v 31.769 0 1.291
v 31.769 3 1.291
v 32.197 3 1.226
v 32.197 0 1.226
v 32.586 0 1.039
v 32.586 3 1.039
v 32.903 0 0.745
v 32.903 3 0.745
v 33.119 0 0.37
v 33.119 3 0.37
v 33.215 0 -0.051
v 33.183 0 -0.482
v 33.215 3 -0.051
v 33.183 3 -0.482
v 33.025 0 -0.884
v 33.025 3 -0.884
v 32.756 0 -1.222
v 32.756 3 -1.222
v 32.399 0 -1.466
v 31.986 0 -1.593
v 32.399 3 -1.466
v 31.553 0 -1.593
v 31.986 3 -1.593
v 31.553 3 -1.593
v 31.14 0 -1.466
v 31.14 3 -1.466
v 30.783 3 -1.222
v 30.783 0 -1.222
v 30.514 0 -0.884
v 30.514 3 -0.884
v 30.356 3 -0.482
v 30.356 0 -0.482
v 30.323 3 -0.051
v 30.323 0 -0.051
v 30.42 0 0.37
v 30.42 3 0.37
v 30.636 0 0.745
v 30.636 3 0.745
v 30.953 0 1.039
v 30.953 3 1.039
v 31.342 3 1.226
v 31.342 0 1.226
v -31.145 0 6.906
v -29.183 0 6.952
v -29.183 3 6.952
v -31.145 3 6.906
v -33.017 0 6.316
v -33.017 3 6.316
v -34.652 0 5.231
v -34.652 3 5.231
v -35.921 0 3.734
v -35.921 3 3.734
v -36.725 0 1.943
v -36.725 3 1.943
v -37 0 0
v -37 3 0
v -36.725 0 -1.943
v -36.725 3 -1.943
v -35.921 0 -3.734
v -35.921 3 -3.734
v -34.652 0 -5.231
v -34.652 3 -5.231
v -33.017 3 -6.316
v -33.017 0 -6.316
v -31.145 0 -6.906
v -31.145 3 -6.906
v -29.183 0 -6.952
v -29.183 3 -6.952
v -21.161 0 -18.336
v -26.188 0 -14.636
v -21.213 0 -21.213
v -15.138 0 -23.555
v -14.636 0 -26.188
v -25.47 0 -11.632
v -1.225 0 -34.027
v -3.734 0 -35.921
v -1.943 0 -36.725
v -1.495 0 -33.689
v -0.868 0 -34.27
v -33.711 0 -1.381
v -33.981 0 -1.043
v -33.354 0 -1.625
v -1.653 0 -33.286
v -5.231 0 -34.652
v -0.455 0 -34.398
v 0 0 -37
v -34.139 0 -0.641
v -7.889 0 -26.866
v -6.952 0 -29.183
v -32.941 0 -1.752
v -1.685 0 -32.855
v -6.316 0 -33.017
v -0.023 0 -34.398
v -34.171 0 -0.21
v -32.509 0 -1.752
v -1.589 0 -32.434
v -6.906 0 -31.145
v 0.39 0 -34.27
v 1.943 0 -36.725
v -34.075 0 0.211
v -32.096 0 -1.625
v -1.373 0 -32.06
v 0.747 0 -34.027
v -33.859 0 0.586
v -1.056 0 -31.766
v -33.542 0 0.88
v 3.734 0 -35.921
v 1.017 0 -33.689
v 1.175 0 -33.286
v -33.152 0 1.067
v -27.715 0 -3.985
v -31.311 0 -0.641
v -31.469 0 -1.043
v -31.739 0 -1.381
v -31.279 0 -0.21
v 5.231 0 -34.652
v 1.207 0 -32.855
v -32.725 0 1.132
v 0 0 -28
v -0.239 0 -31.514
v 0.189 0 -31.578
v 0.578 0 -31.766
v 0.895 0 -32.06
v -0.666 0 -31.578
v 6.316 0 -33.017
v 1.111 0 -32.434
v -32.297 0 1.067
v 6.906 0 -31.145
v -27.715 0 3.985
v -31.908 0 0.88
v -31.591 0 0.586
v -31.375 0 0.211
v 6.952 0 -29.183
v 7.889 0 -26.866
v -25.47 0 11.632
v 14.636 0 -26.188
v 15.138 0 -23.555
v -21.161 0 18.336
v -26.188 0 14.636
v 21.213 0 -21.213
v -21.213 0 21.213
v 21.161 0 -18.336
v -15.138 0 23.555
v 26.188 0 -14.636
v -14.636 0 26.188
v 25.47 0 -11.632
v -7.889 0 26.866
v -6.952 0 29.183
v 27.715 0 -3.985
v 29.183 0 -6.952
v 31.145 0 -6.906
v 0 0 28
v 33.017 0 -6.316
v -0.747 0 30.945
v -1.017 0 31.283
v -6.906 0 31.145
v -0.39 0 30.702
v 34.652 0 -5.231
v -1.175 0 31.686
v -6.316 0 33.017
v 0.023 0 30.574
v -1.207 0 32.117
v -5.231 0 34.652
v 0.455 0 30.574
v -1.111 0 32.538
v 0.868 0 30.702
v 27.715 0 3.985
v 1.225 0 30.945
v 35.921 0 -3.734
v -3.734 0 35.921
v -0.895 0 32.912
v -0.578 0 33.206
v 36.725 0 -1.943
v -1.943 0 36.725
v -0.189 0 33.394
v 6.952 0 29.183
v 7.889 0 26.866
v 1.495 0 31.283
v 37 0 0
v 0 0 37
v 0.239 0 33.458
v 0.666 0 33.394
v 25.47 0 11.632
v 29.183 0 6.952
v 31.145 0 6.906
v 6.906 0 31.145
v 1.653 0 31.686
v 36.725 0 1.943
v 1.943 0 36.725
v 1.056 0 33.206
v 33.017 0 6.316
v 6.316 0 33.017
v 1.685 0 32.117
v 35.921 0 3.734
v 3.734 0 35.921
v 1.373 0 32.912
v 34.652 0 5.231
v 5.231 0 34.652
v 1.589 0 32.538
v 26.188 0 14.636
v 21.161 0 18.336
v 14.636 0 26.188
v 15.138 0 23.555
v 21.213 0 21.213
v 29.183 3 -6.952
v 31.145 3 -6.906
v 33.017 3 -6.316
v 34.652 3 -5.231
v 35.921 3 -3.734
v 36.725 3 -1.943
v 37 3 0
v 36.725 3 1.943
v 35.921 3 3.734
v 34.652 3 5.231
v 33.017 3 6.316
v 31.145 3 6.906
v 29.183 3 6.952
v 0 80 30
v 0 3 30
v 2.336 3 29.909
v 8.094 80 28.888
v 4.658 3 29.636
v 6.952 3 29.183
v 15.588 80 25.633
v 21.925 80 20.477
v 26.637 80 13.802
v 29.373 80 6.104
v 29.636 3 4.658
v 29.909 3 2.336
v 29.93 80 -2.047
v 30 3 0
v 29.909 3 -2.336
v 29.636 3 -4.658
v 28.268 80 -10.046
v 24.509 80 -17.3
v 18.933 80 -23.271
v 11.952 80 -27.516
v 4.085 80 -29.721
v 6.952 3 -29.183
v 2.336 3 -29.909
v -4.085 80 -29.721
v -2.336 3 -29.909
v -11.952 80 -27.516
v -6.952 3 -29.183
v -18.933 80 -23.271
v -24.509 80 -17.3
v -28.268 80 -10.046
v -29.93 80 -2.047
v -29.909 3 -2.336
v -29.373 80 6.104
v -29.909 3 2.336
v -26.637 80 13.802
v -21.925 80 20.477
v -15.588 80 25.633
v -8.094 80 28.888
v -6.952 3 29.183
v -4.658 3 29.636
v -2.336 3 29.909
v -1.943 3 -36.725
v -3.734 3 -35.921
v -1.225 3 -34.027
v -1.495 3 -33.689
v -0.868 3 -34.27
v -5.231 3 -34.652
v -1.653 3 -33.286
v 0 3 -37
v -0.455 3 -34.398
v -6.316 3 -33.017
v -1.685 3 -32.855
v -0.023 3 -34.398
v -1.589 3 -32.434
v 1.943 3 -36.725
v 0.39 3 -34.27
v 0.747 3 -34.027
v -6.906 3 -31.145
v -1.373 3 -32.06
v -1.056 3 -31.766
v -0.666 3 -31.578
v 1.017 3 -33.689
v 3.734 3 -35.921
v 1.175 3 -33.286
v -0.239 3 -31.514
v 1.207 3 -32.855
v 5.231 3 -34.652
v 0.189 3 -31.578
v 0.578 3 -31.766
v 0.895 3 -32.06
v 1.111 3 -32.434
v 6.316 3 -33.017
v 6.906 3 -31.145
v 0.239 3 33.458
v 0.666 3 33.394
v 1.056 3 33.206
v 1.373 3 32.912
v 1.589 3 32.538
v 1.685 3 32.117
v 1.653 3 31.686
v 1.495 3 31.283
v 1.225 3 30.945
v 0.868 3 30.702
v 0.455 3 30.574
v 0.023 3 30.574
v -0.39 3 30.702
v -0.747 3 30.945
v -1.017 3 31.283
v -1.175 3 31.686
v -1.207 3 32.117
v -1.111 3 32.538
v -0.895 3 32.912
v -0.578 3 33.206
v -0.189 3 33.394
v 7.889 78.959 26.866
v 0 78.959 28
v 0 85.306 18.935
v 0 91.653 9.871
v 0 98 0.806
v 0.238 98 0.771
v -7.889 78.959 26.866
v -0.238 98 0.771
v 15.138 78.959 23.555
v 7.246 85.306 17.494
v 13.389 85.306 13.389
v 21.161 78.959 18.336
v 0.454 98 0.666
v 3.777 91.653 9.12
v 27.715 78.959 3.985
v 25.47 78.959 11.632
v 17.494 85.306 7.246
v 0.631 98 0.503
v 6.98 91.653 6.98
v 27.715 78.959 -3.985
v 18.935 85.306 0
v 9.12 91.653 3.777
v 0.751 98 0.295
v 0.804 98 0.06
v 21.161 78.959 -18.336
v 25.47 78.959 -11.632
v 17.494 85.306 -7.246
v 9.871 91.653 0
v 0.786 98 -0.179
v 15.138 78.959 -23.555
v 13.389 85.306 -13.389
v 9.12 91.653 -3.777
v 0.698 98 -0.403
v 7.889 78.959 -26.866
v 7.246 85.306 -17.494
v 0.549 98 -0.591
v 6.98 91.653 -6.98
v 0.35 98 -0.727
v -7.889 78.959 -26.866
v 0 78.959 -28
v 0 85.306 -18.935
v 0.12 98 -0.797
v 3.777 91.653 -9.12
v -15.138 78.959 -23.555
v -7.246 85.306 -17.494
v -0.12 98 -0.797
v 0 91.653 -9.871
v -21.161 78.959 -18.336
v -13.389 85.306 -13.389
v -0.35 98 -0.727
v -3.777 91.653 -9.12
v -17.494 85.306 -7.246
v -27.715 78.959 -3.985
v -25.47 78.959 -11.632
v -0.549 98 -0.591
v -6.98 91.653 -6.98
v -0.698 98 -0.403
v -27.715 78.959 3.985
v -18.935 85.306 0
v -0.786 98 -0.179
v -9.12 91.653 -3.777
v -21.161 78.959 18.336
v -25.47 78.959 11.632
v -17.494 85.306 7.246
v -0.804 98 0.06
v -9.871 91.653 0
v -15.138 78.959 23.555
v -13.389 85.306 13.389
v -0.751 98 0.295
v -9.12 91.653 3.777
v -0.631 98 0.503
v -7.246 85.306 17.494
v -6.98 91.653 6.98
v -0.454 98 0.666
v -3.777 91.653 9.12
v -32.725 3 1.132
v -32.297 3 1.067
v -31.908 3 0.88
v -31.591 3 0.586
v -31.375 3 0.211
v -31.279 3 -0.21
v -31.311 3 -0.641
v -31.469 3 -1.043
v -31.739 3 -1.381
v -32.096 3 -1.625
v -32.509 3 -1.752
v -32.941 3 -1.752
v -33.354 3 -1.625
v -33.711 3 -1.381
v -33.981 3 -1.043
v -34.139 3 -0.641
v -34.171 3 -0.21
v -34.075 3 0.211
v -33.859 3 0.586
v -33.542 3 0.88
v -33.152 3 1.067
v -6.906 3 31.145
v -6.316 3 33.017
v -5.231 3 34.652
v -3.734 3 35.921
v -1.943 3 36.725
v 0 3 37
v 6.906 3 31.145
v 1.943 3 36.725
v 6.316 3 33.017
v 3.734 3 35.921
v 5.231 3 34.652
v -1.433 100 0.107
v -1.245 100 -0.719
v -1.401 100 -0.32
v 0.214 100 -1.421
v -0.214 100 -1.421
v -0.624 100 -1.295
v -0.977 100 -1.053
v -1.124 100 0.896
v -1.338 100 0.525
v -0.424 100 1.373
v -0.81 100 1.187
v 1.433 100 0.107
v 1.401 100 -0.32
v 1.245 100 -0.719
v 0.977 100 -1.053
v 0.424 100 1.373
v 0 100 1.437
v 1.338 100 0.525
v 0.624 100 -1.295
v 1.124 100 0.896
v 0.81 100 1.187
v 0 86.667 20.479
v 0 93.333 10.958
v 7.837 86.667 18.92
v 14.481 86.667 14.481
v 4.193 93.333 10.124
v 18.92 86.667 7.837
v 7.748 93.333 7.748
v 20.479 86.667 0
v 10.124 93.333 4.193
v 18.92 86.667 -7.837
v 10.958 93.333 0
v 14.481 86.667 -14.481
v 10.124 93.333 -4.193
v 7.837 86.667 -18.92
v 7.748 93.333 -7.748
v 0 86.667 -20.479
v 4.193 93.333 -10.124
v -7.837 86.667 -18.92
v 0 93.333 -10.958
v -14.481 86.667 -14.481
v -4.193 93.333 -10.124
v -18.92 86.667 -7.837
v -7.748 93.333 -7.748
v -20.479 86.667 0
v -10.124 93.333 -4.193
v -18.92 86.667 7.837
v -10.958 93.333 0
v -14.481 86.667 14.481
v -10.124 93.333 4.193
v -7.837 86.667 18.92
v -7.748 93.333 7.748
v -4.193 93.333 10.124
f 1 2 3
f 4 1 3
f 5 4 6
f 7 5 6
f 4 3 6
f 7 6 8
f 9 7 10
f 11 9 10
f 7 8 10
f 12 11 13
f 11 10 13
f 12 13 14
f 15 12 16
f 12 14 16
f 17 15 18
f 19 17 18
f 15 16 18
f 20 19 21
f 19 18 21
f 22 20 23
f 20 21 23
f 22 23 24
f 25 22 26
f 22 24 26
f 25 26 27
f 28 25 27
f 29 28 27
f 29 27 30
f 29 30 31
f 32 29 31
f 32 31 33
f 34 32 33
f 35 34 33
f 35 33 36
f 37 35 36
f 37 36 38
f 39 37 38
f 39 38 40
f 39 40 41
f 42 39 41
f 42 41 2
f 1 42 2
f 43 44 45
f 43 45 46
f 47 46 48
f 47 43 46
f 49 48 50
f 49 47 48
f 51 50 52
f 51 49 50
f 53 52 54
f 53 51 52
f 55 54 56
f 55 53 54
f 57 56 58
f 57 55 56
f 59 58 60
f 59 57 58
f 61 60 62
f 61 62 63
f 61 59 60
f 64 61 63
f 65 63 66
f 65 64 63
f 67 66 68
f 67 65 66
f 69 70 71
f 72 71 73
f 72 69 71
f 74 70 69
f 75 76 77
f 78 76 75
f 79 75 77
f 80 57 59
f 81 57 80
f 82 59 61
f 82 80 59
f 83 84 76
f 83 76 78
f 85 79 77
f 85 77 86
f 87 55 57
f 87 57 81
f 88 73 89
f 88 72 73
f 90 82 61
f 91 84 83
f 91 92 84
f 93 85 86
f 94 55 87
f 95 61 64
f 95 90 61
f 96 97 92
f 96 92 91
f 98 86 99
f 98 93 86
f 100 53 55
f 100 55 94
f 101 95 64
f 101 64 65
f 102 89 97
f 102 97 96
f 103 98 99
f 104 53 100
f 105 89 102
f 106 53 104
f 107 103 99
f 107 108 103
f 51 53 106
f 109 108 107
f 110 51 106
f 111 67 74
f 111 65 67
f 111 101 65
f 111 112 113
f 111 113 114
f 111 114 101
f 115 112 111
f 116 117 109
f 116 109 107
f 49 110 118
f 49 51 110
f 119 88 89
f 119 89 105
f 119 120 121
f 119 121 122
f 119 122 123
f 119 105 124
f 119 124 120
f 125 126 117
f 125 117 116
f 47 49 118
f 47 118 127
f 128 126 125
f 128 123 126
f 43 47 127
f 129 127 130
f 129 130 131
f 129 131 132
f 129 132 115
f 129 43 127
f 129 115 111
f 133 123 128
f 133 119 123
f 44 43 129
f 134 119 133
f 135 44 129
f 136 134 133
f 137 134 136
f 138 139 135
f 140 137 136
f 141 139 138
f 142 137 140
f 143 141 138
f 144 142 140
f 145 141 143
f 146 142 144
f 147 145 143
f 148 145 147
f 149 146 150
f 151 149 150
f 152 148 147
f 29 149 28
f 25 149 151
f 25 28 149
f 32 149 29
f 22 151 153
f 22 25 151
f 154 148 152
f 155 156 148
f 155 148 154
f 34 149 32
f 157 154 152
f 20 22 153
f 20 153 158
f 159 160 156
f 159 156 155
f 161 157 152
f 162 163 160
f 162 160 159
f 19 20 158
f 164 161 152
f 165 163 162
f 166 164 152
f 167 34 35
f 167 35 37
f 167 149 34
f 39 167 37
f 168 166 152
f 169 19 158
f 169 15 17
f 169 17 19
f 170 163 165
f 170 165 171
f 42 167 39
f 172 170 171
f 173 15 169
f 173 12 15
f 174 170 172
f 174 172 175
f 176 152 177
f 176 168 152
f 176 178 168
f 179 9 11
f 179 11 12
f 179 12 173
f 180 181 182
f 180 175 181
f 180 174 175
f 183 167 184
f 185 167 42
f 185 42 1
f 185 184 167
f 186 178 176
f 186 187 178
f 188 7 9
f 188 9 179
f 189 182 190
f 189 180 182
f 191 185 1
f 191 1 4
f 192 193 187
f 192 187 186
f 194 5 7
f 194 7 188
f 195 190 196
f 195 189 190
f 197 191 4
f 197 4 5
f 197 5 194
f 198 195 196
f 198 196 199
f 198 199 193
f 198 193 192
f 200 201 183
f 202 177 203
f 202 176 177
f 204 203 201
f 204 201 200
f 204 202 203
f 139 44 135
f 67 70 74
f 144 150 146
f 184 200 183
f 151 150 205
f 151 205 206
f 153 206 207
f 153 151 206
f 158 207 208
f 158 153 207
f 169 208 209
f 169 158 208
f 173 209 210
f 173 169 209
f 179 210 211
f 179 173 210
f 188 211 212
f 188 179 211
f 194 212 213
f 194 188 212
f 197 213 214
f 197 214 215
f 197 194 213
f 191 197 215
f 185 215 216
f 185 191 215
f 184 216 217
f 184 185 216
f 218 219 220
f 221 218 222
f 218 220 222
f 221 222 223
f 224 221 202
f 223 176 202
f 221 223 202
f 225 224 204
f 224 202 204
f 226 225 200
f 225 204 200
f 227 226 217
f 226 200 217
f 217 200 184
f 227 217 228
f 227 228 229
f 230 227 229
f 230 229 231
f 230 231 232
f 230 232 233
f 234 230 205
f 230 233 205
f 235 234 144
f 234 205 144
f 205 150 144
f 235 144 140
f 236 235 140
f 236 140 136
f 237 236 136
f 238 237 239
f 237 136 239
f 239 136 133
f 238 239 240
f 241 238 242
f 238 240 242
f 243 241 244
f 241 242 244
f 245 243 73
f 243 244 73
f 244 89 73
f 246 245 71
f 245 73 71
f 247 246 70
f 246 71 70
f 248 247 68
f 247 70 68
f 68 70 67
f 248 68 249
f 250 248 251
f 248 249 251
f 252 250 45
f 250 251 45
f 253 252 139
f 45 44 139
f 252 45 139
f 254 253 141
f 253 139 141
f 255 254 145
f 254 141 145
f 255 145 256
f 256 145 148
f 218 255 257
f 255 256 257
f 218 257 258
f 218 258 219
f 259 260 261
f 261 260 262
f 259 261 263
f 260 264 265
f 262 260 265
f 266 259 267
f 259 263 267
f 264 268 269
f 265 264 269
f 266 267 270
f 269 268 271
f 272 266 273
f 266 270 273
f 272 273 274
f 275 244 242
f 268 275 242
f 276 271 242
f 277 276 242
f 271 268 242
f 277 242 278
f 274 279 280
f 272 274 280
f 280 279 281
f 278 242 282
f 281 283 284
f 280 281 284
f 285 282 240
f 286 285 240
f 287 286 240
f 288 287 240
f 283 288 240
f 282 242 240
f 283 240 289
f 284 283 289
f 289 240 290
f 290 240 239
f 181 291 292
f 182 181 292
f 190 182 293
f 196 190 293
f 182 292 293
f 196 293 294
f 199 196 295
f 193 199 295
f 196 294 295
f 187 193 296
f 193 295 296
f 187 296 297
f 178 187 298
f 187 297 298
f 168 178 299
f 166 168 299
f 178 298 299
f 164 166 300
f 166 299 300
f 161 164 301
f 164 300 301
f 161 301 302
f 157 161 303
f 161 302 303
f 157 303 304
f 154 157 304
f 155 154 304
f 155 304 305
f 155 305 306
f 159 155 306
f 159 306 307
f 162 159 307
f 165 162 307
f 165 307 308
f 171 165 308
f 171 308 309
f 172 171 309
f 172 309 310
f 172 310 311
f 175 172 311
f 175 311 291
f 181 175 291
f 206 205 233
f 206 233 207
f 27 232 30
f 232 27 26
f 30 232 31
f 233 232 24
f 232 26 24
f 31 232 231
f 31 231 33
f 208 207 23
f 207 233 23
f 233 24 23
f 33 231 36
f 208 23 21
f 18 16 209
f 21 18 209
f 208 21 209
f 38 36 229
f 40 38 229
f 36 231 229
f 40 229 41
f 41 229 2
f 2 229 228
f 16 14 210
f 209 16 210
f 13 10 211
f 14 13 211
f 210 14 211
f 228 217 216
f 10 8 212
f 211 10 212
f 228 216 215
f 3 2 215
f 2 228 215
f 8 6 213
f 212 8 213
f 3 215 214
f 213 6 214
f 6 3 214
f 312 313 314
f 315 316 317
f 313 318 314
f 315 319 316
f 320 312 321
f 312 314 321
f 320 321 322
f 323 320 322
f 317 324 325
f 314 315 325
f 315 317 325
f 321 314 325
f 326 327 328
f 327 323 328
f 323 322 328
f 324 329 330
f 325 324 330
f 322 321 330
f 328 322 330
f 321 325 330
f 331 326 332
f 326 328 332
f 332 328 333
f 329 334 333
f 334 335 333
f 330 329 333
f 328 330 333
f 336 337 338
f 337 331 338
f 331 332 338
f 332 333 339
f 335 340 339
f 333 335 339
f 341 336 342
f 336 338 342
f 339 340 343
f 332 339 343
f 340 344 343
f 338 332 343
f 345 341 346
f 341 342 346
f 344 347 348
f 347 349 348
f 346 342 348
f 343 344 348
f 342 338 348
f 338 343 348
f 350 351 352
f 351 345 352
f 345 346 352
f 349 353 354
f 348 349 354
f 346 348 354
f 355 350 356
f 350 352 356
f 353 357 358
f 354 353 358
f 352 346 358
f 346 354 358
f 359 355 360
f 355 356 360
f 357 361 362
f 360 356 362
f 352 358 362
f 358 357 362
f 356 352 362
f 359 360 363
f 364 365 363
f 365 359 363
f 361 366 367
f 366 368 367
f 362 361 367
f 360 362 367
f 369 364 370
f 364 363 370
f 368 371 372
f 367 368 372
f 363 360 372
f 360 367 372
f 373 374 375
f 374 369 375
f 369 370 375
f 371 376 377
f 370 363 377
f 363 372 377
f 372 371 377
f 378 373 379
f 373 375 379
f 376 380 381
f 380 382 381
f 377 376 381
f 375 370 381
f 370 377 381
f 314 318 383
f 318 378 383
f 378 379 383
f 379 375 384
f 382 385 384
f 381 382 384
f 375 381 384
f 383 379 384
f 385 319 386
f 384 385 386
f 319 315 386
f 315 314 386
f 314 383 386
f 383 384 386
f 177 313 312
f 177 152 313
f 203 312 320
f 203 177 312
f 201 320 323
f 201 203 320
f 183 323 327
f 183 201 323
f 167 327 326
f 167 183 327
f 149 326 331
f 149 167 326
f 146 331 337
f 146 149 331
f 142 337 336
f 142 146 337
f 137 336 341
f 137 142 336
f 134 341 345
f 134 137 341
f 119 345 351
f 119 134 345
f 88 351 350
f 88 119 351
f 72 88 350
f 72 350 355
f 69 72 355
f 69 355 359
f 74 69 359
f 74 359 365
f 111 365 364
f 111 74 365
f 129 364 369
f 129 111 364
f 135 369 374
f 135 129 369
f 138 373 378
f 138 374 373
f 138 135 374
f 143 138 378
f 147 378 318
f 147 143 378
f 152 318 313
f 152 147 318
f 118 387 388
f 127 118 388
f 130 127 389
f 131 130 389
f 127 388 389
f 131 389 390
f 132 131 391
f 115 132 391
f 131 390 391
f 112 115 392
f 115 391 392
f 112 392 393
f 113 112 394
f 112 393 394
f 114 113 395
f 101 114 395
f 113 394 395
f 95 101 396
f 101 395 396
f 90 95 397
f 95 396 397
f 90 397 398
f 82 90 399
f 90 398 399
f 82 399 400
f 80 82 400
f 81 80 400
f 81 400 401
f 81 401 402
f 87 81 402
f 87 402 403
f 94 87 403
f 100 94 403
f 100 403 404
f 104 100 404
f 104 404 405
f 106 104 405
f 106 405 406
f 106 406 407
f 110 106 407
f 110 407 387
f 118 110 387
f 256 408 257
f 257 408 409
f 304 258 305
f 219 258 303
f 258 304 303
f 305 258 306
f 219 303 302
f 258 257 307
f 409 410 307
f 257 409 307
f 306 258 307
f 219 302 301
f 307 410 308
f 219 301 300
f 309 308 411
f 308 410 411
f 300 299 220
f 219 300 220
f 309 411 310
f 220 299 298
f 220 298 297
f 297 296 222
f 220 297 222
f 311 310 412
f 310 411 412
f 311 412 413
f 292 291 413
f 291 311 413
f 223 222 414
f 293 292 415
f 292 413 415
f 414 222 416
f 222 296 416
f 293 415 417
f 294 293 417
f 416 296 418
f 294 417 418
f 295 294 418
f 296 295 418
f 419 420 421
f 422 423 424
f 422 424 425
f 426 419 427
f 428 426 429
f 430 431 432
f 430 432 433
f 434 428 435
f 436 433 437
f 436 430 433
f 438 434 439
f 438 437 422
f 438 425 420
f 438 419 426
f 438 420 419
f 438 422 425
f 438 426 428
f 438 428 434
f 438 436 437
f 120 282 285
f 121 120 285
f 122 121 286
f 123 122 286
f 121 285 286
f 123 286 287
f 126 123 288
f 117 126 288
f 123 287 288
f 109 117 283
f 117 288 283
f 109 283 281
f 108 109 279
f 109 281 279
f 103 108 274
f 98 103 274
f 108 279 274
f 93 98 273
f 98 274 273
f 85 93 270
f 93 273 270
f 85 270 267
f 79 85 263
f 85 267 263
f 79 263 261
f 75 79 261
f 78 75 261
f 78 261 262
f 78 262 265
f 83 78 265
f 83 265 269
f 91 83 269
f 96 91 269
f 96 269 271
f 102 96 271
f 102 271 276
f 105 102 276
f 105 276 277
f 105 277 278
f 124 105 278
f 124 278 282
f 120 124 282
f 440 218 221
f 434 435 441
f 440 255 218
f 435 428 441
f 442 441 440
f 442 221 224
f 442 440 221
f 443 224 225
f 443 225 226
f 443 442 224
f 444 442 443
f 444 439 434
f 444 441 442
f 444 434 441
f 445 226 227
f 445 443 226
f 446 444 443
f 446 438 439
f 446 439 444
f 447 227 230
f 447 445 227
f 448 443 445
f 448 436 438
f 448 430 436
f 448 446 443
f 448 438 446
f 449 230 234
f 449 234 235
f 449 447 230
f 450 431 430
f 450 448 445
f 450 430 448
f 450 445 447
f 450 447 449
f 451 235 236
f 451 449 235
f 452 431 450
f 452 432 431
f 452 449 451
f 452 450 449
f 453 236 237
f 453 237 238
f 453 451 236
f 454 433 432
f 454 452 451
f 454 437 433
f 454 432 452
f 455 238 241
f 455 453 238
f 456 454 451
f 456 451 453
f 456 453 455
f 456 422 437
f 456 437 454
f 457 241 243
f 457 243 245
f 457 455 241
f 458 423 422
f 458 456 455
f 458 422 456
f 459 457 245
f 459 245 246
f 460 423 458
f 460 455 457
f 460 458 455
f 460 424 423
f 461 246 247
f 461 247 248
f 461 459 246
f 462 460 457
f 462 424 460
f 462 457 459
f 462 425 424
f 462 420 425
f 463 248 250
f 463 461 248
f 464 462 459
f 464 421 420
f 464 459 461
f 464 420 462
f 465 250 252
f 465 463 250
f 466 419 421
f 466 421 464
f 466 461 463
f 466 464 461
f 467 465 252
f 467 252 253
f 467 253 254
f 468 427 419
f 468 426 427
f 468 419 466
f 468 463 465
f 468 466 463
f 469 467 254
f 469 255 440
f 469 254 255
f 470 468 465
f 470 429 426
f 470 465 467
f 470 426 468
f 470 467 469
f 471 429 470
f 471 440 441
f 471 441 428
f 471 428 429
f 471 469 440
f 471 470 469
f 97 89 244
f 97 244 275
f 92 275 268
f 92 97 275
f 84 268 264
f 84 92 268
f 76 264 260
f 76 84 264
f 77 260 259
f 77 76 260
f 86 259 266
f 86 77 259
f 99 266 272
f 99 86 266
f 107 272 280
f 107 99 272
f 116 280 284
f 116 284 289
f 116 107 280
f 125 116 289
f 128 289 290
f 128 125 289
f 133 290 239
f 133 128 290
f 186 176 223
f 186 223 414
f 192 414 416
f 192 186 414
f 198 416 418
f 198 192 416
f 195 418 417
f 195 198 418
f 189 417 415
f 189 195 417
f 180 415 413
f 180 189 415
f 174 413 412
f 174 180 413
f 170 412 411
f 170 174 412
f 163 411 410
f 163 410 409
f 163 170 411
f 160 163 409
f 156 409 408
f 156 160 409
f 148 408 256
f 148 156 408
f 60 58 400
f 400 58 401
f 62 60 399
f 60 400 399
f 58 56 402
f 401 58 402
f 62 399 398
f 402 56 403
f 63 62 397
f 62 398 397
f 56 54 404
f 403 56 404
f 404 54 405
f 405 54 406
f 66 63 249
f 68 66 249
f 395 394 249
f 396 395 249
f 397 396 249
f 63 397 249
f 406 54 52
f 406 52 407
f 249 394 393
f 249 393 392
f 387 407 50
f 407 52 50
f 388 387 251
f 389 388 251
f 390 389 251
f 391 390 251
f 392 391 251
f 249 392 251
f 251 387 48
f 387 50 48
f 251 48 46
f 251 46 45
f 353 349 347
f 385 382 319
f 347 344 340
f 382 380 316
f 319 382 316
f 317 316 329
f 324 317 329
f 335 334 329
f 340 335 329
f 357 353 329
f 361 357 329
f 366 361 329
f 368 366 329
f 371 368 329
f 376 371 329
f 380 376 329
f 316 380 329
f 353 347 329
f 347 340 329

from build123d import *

# Parameters (mm, degrees)
SKETCH1_R                 = 30
BOSS_EXTRUDE1_DEPTH       = 100
CHAMFER1_SIZE             = 20
CHAMFER1_SIZE2            = 28.562960135
SHELL1_T                  = -2
BOSS_EXTRUDE2_DEPTH       = 3
F_1_0MM_DOWEL_HOLE1_D     = 2.9
F_1_0MM_DOWEL_HOLE1_DEPTH = 9.128752102
F_1_0MM_DOWEL_HOLE1_TIP   = 0.871247898


with BuildPart() as part:
    # Sketch1 → Boss-Extrude1 (new body)
    with BuildSketch(Plane(origin=(0, 0, 0), x_dir=(1, 0, 0), z_dir=(0, 1, 0))):
        with Locations(Location((0, 0, 0), (0, 0, 270))):
            Circle(SKETCH1_R)
    extrude(amount=BOSS_EXTRUDE1_DEPTH)

    # Chamfer1
    chamfer1_edges = [part.edges().sort_by_distance(p)[0] for p in [
        (0, 100, -30),
    ]]
    chamfer1_side = [part.faces().sort_by_distance(p)[0] for p in [
        (0, 50, -30),
    ]]
    chamfer(chamfer1_edges, length=CHAMFER1_SIZE, length2=CHAMFER1_SIZE2, reference=chamfer1_side[0])

    # Shell1
    shell1_openings = [part.faces().sort_by_distance(p)[0] for p in [
        (0, 0, 0),
    ]]
    offset(amount=SHELL1_T, openings=shell1_openings, kind=Kind.INTERSECTION)

    # Sketch2 → Boss-Extrude2 (add)
    with BuildSketch(Plane.XZ):
        with BuildLine():
            ThreePointArc((29.183333333, -6.952197894), (37, 0), (29.183333333, 6.952197894))
            ThreePointArc((29.183333333, 6.952197894), (29.795133831, 3.5), (30, 0))
            ThreePointArc((30, 0), (29.795133831, -3.5), (29.183333333, -6.952197894))
        make_face()
        with BuildLine():
            ThreePointArc((-6.952197894, 29.183333333), (0, 30), (6.952197894, 29.183333333))
            ThreePointArc((6.952197894, 29.183333333), (0, 37), (-6.952197894, 29.183333333))
        make_face()
        with BuildLine():
            ThreePointArc((-29.183333333, -6.952197894), (-30, 0), (-29.183333333, 6.952197894))
            ThreePointArc((-29.183333333, 6.952197894), (-37, 0), (-29.183333333, -6.952197894))
        make_face()
        with BuildLine():
            ThreePointArc((-6.952197894, -29.183333333), (0, -37), (6.952197894, -29.183333333))
            ThreePointArc((6.952197894, -29.183333333), (0, -30), (-6.952197894, -29.183333333))
        make_face()
    extrude(amount=-BOSS_EXTRUDE2_DEPTH)

    # Ø1.0mm Dowel Hole1
    with Locations(Plane(origin=(0.238867715, 0, 32.008273773), x_dir=(0, 0, -1), z_dir=(0, -1, 0))):
        with Locations((0, 0), (32.167518916, 31.530538344), (64.972018405, -0.47773543), (32.326764059, -32.963744633)):
            Hole(F_1_0MM_DOWEL_HOLE1_D / 2, depth=F_1_0MM_DOWEL_HOLE1_DEPTH)
            with Locations((0, 0, -(F_1_0MM_DOWEL_HOLE1_DEPTH + F_1_0MM_DOWEL_HOLE1_TIP / 2))):  # 118° drill point
                Cone(0, F_1_0MM_DOWEL_HOLE1_D / 2, F_1_0MM_DOWEL_HOLE1_TIP, mode=Mode.SUBTRACT)


solid = part.part
